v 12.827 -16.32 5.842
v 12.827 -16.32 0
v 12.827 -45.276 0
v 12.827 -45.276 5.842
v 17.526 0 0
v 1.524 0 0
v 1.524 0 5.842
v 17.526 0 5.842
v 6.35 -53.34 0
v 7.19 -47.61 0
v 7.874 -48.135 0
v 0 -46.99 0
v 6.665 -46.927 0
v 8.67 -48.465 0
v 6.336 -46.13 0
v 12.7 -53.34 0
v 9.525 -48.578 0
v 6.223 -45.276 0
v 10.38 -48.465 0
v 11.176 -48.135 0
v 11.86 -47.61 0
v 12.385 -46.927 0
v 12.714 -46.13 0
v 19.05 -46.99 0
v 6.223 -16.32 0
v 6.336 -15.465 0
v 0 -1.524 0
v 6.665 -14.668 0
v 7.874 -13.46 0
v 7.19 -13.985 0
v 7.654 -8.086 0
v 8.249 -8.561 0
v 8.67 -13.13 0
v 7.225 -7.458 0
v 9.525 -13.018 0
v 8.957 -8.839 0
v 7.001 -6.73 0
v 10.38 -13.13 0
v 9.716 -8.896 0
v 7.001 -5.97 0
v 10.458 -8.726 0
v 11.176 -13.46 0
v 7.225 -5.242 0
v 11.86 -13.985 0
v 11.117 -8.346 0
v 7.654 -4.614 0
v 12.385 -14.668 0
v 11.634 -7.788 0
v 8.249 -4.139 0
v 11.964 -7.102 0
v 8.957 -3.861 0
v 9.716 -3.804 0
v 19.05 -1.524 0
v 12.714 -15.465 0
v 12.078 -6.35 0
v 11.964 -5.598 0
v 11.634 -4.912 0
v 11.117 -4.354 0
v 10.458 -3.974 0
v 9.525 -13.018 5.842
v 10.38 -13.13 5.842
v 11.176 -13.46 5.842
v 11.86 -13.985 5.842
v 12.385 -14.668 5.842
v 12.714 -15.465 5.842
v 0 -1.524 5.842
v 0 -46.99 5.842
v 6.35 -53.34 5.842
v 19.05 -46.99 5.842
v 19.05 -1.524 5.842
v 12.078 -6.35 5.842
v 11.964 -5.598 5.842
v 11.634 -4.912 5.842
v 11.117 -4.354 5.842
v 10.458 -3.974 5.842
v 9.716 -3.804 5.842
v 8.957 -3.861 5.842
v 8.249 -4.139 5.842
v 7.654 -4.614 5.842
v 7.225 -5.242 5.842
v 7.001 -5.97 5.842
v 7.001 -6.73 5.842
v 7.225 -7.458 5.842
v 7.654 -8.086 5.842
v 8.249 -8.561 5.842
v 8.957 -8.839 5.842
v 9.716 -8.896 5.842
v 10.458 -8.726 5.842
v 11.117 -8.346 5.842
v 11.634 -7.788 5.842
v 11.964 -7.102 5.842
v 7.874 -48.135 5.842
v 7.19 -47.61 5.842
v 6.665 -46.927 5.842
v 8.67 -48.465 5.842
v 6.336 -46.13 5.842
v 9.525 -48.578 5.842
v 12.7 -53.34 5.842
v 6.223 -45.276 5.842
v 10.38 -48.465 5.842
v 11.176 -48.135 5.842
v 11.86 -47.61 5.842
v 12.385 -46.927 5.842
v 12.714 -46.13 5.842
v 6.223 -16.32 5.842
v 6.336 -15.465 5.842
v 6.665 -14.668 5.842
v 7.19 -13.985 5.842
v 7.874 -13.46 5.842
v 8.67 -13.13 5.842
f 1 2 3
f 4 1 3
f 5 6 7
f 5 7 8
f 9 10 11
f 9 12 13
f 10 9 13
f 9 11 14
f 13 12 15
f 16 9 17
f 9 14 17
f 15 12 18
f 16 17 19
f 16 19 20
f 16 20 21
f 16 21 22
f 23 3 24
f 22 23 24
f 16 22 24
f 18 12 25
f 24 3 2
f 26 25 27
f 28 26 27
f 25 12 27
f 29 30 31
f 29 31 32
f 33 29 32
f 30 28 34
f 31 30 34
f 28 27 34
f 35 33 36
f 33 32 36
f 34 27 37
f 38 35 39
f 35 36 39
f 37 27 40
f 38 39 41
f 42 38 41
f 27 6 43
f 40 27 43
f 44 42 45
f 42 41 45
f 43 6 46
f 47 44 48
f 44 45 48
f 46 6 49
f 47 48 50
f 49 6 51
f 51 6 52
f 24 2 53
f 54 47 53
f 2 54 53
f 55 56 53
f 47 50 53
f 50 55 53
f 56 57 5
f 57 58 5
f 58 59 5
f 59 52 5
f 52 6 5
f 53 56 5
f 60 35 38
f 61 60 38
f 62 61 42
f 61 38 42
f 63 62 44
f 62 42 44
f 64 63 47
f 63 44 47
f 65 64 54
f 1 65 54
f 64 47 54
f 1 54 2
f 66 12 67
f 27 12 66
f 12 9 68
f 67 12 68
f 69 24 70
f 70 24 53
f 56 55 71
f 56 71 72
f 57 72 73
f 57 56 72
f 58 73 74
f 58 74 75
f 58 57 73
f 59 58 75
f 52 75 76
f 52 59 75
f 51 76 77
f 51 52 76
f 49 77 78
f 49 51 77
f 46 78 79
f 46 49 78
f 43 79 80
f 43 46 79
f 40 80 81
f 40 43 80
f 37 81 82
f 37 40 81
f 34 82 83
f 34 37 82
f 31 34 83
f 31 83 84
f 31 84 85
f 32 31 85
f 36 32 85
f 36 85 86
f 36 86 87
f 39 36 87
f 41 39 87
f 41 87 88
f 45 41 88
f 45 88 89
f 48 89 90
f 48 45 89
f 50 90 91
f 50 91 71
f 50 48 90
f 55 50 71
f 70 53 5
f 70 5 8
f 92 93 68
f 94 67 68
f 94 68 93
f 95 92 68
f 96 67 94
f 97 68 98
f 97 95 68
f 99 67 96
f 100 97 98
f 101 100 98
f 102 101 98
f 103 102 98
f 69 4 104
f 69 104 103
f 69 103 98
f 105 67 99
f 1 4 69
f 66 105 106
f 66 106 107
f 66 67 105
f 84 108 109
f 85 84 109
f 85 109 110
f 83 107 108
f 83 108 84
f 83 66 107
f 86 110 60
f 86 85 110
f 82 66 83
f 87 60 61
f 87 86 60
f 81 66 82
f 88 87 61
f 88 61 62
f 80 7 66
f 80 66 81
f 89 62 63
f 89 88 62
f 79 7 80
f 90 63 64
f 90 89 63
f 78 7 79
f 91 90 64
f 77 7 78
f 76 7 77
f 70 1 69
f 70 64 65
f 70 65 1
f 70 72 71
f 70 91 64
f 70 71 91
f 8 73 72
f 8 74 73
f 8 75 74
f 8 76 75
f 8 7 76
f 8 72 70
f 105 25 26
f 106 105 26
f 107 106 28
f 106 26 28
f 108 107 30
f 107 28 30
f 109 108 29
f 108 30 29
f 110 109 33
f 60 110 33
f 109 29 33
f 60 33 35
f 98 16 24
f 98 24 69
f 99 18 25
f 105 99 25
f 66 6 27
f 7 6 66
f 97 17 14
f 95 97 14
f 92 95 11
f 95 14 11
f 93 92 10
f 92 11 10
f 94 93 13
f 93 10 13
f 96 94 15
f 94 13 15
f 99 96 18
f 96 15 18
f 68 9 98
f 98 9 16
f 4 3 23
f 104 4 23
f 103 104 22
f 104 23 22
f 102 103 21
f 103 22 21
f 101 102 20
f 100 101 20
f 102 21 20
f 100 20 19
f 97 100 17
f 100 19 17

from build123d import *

# Parameters (mm, degrees)
F0_W     = 19.05
F0_H     = 53.34
F0_R     = 2.5527
F1_DEPTH = 5.842
F2_SIZE  = 6.35
F3_SIZE  = 1.524


with BuildPart() as f1:
    # F0 (on Top) → F1 (new body)
    with BuildSketch(Plane.XY):
        with Locations((9.525, -26.67)):
            Rectangle(F0_W, F0_H)
        with BuildLine():
            Line((6.223, -45.2755), (6.223, -16.3195))
            ThreePointArc((6.223, -16.3195), (7.190133, -13.984633), (9.525, -13.0175))
            ThreePointArc((9.525, -13.0175), (11.859867, -13.984633), (12.827, -16.3195))
            Line((12.827, -16.3195), (12.827, -45.2755))
            ThreePointArc((12.827, -45.2755), (11.859867, -47.610367), (9.525, -48.5775))
            ThreePointArc((9.525, -48.5775), (7.190133, -47.610367), (6.223, -45.2755))
        make_face(mode=Mode.SUBTRACT)
        with Locations((9.525, -6.35)):
            Circle(F0_R, mode=Mode.SUBTRACT)
    extrude(amount=F1_DEPTH)

    # F2
    f2_edges = [f1.edges().sort_by_distance(p)[0] for p in [
        (0, -53.34, 2.921),
        (19.05, -53.34, 2.921),
    ]]
    chamfer(f2_edges, length=F2_SIZE)

    # F3
    f3_edges = [f1.edges().sort_by_distance(p)[0] for p in [
        (19.05, 0, 2.921),
        (0, 0, 2.921),
    ]]
    chamfer(f3_edges, length=F3_SIZE)


solid = f1.part
